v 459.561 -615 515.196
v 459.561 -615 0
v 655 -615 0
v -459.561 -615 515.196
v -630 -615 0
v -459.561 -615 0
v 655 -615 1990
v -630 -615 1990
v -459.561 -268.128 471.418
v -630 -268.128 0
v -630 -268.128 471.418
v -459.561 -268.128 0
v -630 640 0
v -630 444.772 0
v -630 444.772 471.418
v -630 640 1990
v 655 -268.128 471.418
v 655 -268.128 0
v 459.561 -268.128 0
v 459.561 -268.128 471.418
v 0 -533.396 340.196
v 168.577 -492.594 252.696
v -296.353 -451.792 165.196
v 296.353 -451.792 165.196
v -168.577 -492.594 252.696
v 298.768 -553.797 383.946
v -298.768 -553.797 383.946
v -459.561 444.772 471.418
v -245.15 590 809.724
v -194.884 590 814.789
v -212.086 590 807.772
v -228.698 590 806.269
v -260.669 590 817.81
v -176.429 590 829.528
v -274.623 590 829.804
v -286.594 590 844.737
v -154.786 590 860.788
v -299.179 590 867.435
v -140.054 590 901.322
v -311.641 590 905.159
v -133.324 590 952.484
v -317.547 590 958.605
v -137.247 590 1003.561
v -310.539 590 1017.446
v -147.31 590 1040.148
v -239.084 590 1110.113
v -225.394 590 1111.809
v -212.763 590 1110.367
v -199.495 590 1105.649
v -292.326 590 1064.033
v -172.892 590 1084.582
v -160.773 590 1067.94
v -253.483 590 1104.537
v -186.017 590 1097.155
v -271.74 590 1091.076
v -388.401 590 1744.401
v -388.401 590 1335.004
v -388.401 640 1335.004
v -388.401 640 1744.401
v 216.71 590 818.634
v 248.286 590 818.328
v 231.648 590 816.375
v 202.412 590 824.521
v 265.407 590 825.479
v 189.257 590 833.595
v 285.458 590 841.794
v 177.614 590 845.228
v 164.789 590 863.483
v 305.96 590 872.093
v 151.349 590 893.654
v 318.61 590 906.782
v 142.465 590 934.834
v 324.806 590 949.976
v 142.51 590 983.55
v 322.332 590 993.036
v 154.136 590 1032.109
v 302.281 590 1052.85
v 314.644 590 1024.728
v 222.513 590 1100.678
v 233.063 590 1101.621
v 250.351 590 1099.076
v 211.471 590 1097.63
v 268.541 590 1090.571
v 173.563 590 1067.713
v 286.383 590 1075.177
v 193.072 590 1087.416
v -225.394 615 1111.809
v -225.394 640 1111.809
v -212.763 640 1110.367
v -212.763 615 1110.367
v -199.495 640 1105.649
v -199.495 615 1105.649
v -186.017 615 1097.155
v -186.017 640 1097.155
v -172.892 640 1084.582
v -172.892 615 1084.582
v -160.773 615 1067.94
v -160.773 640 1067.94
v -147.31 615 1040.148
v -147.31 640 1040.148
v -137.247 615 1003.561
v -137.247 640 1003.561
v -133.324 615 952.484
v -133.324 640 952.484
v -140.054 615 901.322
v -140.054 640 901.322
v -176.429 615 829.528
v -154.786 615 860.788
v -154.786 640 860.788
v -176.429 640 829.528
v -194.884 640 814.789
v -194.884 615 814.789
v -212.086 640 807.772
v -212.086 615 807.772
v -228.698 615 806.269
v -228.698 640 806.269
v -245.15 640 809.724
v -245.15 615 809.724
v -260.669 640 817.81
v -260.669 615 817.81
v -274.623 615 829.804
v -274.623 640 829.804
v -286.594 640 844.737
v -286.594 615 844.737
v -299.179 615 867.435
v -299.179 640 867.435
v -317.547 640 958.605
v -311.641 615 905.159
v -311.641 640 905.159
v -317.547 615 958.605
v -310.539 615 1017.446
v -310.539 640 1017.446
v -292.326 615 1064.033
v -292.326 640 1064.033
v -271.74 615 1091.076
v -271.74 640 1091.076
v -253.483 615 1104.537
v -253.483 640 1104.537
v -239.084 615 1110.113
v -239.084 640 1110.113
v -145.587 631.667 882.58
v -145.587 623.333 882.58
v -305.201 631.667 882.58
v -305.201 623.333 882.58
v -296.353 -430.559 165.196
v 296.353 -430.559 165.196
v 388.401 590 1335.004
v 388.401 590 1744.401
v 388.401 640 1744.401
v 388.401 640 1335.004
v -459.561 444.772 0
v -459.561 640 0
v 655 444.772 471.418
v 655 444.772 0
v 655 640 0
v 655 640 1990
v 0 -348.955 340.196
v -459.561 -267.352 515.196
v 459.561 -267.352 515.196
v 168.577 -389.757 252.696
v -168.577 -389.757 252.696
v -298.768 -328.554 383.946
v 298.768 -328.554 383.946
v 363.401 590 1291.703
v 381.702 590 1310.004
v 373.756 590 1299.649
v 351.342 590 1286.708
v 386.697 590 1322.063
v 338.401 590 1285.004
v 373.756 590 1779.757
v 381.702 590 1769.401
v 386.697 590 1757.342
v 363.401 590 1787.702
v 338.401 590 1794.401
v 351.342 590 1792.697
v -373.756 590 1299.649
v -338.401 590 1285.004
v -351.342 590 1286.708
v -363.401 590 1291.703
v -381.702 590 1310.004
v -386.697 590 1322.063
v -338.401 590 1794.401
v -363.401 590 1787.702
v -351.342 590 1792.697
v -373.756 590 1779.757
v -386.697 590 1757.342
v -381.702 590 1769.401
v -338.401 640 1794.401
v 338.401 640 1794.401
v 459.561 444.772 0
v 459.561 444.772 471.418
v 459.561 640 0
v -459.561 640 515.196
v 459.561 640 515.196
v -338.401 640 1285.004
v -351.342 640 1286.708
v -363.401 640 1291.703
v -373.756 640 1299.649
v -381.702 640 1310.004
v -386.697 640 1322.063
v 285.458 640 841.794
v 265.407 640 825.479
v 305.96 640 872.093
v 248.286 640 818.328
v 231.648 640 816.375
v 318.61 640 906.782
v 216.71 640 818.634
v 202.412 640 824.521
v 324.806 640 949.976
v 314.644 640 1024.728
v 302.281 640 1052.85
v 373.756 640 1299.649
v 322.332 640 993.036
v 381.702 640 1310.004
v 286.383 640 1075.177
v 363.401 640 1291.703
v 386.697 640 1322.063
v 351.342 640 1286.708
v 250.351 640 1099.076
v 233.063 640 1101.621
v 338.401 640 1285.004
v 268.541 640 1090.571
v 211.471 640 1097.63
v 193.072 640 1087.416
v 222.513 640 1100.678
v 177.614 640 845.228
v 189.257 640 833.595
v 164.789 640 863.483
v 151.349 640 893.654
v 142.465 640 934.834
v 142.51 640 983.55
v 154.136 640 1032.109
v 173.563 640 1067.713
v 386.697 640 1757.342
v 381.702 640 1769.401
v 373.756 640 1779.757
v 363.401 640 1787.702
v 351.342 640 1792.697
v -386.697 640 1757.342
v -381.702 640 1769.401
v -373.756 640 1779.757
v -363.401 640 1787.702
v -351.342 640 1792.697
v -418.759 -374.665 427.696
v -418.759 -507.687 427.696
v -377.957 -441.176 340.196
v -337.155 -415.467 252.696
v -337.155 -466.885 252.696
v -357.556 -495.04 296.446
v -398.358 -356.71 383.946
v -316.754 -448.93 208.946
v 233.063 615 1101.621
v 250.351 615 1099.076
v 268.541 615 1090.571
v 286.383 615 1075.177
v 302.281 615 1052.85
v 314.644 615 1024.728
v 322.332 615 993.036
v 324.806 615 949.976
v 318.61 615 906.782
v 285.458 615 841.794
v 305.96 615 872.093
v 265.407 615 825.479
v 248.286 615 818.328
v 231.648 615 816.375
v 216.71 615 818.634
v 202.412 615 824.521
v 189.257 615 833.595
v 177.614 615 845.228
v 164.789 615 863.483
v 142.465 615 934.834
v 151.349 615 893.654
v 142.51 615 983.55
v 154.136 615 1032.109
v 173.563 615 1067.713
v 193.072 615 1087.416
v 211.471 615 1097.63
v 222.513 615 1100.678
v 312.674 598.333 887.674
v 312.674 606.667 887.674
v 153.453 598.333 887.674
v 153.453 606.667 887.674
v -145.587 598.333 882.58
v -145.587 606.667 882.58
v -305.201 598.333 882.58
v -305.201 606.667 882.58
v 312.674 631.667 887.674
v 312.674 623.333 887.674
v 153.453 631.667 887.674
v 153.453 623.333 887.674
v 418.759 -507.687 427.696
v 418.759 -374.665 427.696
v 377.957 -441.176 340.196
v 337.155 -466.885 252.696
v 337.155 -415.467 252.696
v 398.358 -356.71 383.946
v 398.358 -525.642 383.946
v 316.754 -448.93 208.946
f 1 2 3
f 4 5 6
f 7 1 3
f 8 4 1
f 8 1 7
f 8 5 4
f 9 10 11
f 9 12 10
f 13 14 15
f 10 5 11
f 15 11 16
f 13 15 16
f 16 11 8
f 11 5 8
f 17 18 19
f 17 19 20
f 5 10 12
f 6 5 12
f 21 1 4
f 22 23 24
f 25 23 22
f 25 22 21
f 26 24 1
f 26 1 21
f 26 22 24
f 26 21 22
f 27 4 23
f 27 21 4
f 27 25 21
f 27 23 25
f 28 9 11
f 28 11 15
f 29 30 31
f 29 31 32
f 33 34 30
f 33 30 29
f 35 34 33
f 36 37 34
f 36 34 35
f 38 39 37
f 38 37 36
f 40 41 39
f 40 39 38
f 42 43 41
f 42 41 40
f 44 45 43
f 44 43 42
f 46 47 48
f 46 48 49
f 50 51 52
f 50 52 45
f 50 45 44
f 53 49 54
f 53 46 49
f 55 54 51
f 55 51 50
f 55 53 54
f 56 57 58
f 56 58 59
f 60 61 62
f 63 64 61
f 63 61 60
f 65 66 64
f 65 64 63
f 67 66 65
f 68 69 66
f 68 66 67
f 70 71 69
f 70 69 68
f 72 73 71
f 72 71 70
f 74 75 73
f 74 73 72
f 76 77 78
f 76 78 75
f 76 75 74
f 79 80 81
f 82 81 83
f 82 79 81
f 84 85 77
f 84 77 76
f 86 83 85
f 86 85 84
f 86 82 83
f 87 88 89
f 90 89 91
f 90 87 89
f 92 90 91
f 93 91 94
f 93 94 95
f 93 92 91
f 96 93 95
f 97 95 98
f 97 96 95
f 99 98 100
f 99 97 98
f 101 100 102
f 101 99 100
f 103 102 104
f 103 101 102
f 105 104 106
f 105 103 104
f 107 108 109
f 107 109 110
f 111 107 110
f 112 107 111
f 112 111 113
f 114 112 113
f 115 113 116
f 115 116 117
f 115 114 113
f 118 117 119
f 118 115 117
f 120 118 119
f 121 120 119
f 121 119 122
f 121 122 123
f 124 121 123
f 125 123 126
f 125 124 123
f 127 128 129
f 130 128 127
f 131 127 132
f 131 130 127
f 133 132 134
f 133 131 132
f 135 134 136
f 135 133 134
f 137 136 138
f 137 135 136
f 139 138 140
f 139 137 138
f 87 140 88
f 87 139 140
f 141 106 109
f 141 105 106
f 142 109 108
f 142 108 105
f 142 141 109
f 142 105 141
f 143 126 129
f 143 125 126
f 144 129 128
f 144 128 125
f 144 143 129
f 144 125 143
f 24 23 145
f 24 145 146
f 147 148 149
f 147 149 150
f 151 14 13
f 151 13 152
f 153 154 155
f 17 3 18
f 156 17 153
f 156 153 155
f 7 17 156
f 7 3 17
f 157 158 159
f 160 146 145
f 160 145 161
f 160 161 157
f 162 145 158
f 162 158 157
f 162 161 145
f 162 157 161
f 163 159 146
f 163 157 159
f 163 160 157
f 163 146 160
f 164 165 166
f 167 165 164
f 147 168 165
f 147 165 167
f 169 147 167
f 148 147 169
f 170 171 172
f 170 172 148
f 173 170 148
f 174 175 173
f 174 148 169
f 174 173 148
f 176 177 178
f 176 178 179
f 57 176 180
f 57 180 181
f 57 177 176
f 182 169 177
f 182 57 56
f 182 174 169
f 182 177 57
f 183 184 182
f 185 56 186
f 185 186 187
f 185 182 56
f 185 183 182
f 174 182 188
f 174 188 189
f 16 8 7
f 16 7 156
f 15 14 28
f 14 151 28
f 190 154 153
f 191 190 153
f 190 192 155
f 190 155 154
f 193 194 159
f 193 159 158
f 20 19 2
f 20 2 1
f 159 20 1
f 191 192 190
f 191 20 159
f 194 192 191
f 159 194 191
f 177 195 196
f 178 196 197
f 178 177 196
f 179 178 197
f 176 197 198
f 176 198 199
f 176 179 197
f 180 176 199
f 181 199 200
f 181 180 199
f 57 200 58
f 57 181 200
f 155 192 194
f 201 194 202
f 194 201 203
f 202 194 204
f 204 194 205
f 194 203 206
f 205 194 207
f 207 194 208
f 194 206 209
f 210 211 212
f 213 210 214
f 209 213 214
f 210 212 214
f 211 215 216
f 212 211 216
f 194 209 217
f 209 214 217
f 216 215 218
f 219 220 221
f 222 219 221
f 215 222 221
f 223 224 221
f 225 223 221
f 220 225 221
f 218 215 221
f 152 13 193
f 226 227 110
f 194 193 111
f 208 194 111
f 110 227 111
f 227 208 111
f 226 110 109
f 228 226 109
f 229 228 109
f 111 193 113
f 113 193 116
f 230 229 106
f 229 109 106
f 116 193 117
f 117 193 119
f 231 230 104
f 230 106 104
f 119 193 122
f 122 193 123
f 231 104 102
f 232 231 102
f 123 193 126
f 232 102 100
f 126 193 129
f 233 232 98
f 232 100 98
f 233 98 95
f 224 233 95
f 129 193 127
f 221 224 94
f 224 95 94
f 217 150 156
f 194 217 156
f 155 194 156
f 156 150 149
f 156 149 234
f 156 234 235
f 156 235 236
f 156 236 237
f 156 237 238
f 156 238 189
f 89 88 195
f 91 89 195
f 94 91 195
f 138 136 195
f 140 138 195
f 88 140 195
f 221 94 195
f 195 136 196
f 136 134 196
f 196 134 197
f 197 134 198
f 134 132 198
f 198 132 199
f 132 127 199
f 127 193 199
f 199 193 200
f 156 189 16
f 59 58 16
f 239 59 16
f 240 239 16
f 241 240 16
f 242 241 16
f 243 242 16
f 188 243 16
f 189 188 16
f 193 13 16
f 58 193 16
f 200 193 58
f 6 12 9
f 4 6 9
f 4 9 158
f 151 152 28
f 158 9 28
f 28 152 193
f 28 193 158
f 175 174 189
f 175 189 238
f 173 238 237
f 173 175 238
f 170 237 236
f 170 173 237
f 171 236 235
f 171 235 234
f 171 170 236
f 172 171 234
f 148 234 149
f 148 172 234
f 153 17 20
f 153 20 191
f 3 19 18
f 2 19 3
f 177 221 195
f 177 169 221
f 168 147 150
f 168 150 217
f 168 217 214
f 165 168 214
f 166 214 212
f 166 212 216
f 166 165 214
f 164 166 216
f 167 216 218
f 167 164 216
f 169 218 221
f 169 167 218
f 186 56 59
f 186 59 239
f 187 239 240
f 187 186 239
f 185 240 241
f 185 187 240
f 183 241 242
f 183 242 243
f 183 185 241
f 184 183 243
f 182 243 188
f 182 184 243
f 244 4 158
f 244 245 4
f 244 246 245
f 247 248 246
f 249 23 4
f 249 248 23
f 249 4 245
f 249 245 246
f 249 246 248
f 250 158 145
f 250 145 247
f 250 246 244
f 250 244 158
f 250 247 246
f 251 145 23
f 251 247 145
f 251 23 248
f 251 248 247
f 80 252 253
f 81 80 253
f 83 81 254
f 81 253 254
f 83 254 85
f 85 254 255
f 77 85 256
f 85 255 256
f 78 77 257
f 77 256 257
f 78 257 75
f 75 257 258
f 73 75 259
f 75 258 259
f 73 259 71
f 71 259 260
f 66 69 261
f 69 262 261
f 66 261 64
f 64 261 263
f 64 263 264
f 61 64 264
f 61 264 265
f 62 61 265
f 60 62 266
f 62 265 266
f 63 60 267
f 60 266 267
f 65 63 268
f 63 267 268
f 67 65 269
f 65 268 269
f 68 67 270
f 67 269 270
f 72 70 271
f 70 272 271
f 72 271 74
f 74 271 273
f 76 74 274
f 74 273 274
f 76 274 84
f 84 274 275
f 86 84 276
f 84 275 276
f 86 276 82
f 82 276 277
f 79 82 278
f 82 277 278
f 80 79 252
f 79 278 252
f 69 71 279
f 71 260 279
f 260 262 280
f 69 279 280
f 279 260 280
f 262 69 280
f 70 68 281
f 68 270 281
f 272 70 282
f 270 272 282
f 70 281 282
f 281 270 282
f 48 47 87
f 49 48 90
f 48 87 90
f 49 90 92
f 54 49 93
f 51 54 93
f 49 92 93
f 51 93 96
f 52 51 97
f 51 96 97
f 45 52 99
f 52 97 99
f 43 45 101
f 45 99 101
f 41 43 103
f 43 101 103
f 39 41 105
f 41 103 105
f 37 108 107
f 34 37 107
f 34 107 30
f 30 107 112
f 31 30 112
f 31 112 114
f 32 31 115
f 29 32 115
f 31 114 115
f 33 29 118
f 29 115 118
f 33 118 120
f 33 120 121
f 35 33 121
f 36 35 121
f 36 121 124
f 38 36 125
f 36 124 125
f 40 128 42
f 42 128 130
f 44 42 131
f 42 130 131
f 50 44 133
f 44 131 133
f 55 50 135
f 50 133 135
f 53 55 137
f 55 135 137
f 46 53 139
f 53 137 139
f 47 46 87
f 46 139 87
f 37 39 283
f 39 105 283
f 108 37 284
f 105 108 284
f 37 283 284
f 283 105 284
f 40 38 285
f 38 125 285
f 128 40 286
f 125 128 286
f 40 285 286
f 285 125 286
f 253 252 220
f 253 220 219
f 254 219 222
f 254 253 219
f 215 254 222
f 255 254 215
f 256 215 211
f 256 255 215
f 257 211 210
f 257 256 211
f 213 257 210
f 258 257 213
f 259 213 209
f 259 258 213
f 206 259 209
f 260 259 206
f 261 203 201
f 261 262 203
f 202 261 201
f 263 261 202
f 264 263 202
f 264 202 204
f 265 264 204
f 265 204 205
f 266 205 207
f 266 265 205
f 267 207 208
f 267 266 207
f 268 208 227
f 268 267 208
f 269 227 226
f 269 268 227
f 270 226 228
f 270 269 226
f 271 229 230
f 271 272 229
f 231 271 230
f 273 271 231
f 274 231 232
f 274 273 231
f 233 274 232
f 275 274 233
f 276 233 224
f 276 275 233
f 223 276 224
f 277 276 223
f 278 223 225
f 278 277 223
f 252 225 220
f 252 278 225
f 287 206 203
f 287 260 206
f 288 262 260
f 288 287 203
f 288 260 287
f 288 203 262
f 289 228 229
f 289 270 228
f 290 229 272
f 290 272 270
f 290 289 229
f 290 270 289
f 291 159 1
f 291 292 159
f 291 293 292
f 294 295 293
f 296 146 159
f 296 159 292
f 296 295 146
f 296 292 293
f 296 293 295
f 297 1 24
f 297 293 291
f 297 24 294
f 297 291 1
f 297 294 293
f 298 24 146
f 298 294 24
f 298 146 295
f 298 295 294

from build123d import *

# Parameters (mm, degrees)
F0_W      = 1260
F0_H      = 1230
F1_DEPTH  = 1990
F3_DEPTH  = 25
F4_DEPTH  = 25
F5_W      = 919.1210865974
F5_H      = 1030.3928852081
F6_DEPTH  = 3660
F7_DEPTH  = 25
F8_W      = 712.8995805979
F8_H      = 942.8355097771
F9_DEPTH  = 3440
F10_W     = 919.1210865974
F10_H     = 347.6484620571
F11_DEPTH = 350
F11_TAPER = 25


with BuildPart() as f1:
    # F0 (on Top) → F1 (new body)
    with BuildSketch(Plane.XY):
        Rectangle(F0_W, F0_H)
    extrude(amount=F1_DEPTH)

    # F2 (on face) → F3 (cut)
    with BuildSketch(Plane(origin=(0, 615, 0), x_dir=(-1, 0, 0), z_dir=(0, 1, 0))):
        with BuildLine():
            add(Edge.make_bspline(
                [(-233.063429594, 1101.6209125519), (-392.2844546987, 1101.6209125519), (-312.6739421464, 887.6741528511), (-233.063429594, 673.7273931503), (-153.4529170417, 887.6741528511), (-73.8424044893, 1101.6209125519), (-233.063429594, 1101.6209125519)],
                knots=[0, 0, 0, 2.0943951024, 2.0943951024, 4.1887902048, 4.1887902048, 6.2831853072, 6.2831853072, 6.2831853072], degree=2, weights=[1, 0.5, 1, 0.5, 1, 0.5, 1]))
        make_face()
        with BuildLine():
            add(Edge.make_bspline(
                [(225.3940701485, 1111.8088960648), (65.7797781257, 1111.8088960648), (145.5869241371, 882.5801610947), (225.3940701485, 653.3514261246), (305.2012161599, 882.5801610947), (385.0083621713, 1111.8088960648), (225.3940701485, 1111.8088960648)],
                knots=[0, 0, 0, 2.0943951024, 2.0943951024, 4.1887902048, 4.1887902048, 6.2831853072, 6.2831853072, 6.2831853072], degree=2, weights=[1, 0.5, 1, 0.5, 1, 0.5, 1]))
        make_face()
        with BuildLine():
            Line((-338.4010910988, 1285.003900528), (338.4010910988, 1285.003900528))
            ThreePointArc((338.4010910988, 1285.003900528), (373.7564301581, 1299.6485614686), (388.4010910988, 1335.003900528))
            Line((388.4010910988, 1335.003900528), (388.4010910988, 1744.4011688232))
            ThreePointArc((388.4010910988, 1744.4011688232), (373.7564301581, 1779.7565078826), (338.4010910988, 1794.4011688232))
            Line((338.4010910988, 1794.4011688232), (-338.4010910988, 1794.4011688232))
            ThreePointArc((-338.4010910988, 1794.4011688232), (-373.7564301581, 1779.7565078826), (-388.4010910988, 1744.4011688232))
            Line((-388.4010910988, 1744.4011688232), (-388.4010910988, 1335.003900528))
            ThreePointArc((-388.4010910988, 1335.003900528), (-373.7564301581, 1299.6485614686), (-338.4010910988, 1285.003900528))
        make_face()
    extrude(amount=-F3_DEPTH, mode=Mode.SUBTRACT)

    # F4 (add): a face of the model
    f4_faces = [f1.faces().sort_by_distance(p)[0] for p in [
        (0.1841211697, 615, 890.8357911974),
    ]]
    extrude(f4_faces, amount=F4_DEPTH)

    # F5 (on face) → F6 (cut)
    with BuildSketch(Plane(origin=(0, 640, 0), x_dir=(-1, 0, 0), z_dir=(0, 1, 0))):
        Rectangle(F5_W, F5_H)
    extrude(amount=-F6_DEPTH, mode=Mode.SUBTRACT)

    # F7 (add): a face of the model
    f7_faces = [f1.faces().sort_by_distance(p)[0] for p in [
        (630, 12.5, 995),
    ]]
    extrude(f7_faces, amount=F7_DEPTH)

    # F8 (on face) → F9 (cut)
    with BuildSketch(Plane.YZ.offset(655)):
        with Locations((88.3218422532, 0)):
            Rectangle(F8_W, F8_H)
    extrude(amount=-F9_DEPTH, mode=Mode.SUBTRACT)

    # F10 (on face) → F11 (join)
    with BuildSketch(Plane(origin=(0, 0, 515.1964426041), x_dir=(1, 0, 0), z_dir=(0, 0, -1))):
        with Locations((0, 441.1757689714)):
            Rectangle(F10_W, F10_H)
    extrude(amount=F11_DEPTH, taper=F11_TAPER)


solid = f1.part
